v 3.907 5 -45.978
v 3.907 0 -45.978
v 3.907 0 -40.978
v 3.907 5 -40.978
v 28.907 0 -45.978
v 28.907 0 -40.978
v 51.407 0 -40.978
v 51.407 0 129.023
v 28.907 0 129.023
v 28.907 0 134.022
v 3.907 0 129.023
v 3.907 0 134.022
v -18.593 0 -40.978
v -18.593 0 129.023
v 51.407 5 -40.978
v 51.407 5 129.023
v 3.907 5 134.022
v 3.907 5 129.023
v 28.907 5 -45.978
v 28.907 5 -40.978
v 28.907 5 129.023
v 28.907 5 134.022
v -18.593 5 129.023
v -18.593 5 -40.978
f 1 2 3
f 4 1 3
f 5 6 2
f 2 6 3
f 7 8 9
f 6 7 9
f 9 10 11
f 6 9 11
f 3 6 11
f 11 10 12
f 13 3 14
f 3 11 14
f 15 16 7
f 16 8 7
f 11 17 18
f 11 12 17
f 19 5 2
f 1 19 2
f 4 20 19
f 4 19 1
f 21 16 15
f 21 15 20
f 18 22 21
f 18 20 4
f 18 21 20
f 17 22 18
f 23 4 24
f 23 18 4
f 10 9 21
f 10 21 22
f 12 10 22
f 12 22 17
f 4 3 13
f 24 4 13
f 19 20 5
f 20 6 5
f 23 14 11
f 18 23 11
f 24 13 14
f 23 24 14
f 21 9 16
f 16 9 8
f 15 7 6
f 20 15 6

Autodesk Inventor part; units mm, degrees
ref_plane "YZ Plane" through (0, 0, 0) normal (1, 0, 0) x (0, 1, 0)
ref_plane "XZ Plane" through (0, 0, 0) normal (0, 1, 0) x (-1, 0, 0)
ref_plane "XY Plane" through (0, 0, 0) normal (0, 0, 1) x (1, 0, 0)
sketch "Sketch1" plane through (0, 0, 0) normal (0, 1, 0) x (-1, 0, 0)
  line L0 (18.5932, 129.0225) -> (-51.4068, 129.0225)
  line L1 (-51.4068, 129.0225) -> (-51.4068, -40.9775)
  line L2 (-51.4068, -40.9775) -> (18.5932, -40.9775)
  line L3 (18.5932, -40.9775) -> (18.5932, 129.0225)
  line L4 (-3.9068, 129.0225) -> (-28.9068, 129.0225)
  line L5 (-28.9068, 129.0225) -> (-28.9068, 134.0225)
  line L6 (-28.9068, 134.0225) -> (-3.9068, 134.0225)
  line L7 (-3.9068, 134.0225) -> (-3.9068, 129.0225)
  line L8 (-3.9068, -40.9775) -> (-28.9068, -40.9775)
  line L9 (-28.9068, -40.9775) -> (-28.9068, -45.9775)
  line L10 (-28.9068, -45.9775) -> (-3.9068, -45.9775)
  line L11 (-3.9068, -45.9775) -> (-3.9068, -40.9775)
  point P0 (0, 0)
  dimension "d0" = 70
  dimension "d1" = 170
  dimension "d2" = 25
  dimension "d3" = 5
  dimension "d4" = 22.5
  dimension "d5" = 25
  dimension "d6" = 5
extrude "Extrusion1" add sketch "Sketch1" along normal blind 5
equation "\"d4\" = -0.5 * d2 + 0.5 * d0"
properties part number "piso medio"
